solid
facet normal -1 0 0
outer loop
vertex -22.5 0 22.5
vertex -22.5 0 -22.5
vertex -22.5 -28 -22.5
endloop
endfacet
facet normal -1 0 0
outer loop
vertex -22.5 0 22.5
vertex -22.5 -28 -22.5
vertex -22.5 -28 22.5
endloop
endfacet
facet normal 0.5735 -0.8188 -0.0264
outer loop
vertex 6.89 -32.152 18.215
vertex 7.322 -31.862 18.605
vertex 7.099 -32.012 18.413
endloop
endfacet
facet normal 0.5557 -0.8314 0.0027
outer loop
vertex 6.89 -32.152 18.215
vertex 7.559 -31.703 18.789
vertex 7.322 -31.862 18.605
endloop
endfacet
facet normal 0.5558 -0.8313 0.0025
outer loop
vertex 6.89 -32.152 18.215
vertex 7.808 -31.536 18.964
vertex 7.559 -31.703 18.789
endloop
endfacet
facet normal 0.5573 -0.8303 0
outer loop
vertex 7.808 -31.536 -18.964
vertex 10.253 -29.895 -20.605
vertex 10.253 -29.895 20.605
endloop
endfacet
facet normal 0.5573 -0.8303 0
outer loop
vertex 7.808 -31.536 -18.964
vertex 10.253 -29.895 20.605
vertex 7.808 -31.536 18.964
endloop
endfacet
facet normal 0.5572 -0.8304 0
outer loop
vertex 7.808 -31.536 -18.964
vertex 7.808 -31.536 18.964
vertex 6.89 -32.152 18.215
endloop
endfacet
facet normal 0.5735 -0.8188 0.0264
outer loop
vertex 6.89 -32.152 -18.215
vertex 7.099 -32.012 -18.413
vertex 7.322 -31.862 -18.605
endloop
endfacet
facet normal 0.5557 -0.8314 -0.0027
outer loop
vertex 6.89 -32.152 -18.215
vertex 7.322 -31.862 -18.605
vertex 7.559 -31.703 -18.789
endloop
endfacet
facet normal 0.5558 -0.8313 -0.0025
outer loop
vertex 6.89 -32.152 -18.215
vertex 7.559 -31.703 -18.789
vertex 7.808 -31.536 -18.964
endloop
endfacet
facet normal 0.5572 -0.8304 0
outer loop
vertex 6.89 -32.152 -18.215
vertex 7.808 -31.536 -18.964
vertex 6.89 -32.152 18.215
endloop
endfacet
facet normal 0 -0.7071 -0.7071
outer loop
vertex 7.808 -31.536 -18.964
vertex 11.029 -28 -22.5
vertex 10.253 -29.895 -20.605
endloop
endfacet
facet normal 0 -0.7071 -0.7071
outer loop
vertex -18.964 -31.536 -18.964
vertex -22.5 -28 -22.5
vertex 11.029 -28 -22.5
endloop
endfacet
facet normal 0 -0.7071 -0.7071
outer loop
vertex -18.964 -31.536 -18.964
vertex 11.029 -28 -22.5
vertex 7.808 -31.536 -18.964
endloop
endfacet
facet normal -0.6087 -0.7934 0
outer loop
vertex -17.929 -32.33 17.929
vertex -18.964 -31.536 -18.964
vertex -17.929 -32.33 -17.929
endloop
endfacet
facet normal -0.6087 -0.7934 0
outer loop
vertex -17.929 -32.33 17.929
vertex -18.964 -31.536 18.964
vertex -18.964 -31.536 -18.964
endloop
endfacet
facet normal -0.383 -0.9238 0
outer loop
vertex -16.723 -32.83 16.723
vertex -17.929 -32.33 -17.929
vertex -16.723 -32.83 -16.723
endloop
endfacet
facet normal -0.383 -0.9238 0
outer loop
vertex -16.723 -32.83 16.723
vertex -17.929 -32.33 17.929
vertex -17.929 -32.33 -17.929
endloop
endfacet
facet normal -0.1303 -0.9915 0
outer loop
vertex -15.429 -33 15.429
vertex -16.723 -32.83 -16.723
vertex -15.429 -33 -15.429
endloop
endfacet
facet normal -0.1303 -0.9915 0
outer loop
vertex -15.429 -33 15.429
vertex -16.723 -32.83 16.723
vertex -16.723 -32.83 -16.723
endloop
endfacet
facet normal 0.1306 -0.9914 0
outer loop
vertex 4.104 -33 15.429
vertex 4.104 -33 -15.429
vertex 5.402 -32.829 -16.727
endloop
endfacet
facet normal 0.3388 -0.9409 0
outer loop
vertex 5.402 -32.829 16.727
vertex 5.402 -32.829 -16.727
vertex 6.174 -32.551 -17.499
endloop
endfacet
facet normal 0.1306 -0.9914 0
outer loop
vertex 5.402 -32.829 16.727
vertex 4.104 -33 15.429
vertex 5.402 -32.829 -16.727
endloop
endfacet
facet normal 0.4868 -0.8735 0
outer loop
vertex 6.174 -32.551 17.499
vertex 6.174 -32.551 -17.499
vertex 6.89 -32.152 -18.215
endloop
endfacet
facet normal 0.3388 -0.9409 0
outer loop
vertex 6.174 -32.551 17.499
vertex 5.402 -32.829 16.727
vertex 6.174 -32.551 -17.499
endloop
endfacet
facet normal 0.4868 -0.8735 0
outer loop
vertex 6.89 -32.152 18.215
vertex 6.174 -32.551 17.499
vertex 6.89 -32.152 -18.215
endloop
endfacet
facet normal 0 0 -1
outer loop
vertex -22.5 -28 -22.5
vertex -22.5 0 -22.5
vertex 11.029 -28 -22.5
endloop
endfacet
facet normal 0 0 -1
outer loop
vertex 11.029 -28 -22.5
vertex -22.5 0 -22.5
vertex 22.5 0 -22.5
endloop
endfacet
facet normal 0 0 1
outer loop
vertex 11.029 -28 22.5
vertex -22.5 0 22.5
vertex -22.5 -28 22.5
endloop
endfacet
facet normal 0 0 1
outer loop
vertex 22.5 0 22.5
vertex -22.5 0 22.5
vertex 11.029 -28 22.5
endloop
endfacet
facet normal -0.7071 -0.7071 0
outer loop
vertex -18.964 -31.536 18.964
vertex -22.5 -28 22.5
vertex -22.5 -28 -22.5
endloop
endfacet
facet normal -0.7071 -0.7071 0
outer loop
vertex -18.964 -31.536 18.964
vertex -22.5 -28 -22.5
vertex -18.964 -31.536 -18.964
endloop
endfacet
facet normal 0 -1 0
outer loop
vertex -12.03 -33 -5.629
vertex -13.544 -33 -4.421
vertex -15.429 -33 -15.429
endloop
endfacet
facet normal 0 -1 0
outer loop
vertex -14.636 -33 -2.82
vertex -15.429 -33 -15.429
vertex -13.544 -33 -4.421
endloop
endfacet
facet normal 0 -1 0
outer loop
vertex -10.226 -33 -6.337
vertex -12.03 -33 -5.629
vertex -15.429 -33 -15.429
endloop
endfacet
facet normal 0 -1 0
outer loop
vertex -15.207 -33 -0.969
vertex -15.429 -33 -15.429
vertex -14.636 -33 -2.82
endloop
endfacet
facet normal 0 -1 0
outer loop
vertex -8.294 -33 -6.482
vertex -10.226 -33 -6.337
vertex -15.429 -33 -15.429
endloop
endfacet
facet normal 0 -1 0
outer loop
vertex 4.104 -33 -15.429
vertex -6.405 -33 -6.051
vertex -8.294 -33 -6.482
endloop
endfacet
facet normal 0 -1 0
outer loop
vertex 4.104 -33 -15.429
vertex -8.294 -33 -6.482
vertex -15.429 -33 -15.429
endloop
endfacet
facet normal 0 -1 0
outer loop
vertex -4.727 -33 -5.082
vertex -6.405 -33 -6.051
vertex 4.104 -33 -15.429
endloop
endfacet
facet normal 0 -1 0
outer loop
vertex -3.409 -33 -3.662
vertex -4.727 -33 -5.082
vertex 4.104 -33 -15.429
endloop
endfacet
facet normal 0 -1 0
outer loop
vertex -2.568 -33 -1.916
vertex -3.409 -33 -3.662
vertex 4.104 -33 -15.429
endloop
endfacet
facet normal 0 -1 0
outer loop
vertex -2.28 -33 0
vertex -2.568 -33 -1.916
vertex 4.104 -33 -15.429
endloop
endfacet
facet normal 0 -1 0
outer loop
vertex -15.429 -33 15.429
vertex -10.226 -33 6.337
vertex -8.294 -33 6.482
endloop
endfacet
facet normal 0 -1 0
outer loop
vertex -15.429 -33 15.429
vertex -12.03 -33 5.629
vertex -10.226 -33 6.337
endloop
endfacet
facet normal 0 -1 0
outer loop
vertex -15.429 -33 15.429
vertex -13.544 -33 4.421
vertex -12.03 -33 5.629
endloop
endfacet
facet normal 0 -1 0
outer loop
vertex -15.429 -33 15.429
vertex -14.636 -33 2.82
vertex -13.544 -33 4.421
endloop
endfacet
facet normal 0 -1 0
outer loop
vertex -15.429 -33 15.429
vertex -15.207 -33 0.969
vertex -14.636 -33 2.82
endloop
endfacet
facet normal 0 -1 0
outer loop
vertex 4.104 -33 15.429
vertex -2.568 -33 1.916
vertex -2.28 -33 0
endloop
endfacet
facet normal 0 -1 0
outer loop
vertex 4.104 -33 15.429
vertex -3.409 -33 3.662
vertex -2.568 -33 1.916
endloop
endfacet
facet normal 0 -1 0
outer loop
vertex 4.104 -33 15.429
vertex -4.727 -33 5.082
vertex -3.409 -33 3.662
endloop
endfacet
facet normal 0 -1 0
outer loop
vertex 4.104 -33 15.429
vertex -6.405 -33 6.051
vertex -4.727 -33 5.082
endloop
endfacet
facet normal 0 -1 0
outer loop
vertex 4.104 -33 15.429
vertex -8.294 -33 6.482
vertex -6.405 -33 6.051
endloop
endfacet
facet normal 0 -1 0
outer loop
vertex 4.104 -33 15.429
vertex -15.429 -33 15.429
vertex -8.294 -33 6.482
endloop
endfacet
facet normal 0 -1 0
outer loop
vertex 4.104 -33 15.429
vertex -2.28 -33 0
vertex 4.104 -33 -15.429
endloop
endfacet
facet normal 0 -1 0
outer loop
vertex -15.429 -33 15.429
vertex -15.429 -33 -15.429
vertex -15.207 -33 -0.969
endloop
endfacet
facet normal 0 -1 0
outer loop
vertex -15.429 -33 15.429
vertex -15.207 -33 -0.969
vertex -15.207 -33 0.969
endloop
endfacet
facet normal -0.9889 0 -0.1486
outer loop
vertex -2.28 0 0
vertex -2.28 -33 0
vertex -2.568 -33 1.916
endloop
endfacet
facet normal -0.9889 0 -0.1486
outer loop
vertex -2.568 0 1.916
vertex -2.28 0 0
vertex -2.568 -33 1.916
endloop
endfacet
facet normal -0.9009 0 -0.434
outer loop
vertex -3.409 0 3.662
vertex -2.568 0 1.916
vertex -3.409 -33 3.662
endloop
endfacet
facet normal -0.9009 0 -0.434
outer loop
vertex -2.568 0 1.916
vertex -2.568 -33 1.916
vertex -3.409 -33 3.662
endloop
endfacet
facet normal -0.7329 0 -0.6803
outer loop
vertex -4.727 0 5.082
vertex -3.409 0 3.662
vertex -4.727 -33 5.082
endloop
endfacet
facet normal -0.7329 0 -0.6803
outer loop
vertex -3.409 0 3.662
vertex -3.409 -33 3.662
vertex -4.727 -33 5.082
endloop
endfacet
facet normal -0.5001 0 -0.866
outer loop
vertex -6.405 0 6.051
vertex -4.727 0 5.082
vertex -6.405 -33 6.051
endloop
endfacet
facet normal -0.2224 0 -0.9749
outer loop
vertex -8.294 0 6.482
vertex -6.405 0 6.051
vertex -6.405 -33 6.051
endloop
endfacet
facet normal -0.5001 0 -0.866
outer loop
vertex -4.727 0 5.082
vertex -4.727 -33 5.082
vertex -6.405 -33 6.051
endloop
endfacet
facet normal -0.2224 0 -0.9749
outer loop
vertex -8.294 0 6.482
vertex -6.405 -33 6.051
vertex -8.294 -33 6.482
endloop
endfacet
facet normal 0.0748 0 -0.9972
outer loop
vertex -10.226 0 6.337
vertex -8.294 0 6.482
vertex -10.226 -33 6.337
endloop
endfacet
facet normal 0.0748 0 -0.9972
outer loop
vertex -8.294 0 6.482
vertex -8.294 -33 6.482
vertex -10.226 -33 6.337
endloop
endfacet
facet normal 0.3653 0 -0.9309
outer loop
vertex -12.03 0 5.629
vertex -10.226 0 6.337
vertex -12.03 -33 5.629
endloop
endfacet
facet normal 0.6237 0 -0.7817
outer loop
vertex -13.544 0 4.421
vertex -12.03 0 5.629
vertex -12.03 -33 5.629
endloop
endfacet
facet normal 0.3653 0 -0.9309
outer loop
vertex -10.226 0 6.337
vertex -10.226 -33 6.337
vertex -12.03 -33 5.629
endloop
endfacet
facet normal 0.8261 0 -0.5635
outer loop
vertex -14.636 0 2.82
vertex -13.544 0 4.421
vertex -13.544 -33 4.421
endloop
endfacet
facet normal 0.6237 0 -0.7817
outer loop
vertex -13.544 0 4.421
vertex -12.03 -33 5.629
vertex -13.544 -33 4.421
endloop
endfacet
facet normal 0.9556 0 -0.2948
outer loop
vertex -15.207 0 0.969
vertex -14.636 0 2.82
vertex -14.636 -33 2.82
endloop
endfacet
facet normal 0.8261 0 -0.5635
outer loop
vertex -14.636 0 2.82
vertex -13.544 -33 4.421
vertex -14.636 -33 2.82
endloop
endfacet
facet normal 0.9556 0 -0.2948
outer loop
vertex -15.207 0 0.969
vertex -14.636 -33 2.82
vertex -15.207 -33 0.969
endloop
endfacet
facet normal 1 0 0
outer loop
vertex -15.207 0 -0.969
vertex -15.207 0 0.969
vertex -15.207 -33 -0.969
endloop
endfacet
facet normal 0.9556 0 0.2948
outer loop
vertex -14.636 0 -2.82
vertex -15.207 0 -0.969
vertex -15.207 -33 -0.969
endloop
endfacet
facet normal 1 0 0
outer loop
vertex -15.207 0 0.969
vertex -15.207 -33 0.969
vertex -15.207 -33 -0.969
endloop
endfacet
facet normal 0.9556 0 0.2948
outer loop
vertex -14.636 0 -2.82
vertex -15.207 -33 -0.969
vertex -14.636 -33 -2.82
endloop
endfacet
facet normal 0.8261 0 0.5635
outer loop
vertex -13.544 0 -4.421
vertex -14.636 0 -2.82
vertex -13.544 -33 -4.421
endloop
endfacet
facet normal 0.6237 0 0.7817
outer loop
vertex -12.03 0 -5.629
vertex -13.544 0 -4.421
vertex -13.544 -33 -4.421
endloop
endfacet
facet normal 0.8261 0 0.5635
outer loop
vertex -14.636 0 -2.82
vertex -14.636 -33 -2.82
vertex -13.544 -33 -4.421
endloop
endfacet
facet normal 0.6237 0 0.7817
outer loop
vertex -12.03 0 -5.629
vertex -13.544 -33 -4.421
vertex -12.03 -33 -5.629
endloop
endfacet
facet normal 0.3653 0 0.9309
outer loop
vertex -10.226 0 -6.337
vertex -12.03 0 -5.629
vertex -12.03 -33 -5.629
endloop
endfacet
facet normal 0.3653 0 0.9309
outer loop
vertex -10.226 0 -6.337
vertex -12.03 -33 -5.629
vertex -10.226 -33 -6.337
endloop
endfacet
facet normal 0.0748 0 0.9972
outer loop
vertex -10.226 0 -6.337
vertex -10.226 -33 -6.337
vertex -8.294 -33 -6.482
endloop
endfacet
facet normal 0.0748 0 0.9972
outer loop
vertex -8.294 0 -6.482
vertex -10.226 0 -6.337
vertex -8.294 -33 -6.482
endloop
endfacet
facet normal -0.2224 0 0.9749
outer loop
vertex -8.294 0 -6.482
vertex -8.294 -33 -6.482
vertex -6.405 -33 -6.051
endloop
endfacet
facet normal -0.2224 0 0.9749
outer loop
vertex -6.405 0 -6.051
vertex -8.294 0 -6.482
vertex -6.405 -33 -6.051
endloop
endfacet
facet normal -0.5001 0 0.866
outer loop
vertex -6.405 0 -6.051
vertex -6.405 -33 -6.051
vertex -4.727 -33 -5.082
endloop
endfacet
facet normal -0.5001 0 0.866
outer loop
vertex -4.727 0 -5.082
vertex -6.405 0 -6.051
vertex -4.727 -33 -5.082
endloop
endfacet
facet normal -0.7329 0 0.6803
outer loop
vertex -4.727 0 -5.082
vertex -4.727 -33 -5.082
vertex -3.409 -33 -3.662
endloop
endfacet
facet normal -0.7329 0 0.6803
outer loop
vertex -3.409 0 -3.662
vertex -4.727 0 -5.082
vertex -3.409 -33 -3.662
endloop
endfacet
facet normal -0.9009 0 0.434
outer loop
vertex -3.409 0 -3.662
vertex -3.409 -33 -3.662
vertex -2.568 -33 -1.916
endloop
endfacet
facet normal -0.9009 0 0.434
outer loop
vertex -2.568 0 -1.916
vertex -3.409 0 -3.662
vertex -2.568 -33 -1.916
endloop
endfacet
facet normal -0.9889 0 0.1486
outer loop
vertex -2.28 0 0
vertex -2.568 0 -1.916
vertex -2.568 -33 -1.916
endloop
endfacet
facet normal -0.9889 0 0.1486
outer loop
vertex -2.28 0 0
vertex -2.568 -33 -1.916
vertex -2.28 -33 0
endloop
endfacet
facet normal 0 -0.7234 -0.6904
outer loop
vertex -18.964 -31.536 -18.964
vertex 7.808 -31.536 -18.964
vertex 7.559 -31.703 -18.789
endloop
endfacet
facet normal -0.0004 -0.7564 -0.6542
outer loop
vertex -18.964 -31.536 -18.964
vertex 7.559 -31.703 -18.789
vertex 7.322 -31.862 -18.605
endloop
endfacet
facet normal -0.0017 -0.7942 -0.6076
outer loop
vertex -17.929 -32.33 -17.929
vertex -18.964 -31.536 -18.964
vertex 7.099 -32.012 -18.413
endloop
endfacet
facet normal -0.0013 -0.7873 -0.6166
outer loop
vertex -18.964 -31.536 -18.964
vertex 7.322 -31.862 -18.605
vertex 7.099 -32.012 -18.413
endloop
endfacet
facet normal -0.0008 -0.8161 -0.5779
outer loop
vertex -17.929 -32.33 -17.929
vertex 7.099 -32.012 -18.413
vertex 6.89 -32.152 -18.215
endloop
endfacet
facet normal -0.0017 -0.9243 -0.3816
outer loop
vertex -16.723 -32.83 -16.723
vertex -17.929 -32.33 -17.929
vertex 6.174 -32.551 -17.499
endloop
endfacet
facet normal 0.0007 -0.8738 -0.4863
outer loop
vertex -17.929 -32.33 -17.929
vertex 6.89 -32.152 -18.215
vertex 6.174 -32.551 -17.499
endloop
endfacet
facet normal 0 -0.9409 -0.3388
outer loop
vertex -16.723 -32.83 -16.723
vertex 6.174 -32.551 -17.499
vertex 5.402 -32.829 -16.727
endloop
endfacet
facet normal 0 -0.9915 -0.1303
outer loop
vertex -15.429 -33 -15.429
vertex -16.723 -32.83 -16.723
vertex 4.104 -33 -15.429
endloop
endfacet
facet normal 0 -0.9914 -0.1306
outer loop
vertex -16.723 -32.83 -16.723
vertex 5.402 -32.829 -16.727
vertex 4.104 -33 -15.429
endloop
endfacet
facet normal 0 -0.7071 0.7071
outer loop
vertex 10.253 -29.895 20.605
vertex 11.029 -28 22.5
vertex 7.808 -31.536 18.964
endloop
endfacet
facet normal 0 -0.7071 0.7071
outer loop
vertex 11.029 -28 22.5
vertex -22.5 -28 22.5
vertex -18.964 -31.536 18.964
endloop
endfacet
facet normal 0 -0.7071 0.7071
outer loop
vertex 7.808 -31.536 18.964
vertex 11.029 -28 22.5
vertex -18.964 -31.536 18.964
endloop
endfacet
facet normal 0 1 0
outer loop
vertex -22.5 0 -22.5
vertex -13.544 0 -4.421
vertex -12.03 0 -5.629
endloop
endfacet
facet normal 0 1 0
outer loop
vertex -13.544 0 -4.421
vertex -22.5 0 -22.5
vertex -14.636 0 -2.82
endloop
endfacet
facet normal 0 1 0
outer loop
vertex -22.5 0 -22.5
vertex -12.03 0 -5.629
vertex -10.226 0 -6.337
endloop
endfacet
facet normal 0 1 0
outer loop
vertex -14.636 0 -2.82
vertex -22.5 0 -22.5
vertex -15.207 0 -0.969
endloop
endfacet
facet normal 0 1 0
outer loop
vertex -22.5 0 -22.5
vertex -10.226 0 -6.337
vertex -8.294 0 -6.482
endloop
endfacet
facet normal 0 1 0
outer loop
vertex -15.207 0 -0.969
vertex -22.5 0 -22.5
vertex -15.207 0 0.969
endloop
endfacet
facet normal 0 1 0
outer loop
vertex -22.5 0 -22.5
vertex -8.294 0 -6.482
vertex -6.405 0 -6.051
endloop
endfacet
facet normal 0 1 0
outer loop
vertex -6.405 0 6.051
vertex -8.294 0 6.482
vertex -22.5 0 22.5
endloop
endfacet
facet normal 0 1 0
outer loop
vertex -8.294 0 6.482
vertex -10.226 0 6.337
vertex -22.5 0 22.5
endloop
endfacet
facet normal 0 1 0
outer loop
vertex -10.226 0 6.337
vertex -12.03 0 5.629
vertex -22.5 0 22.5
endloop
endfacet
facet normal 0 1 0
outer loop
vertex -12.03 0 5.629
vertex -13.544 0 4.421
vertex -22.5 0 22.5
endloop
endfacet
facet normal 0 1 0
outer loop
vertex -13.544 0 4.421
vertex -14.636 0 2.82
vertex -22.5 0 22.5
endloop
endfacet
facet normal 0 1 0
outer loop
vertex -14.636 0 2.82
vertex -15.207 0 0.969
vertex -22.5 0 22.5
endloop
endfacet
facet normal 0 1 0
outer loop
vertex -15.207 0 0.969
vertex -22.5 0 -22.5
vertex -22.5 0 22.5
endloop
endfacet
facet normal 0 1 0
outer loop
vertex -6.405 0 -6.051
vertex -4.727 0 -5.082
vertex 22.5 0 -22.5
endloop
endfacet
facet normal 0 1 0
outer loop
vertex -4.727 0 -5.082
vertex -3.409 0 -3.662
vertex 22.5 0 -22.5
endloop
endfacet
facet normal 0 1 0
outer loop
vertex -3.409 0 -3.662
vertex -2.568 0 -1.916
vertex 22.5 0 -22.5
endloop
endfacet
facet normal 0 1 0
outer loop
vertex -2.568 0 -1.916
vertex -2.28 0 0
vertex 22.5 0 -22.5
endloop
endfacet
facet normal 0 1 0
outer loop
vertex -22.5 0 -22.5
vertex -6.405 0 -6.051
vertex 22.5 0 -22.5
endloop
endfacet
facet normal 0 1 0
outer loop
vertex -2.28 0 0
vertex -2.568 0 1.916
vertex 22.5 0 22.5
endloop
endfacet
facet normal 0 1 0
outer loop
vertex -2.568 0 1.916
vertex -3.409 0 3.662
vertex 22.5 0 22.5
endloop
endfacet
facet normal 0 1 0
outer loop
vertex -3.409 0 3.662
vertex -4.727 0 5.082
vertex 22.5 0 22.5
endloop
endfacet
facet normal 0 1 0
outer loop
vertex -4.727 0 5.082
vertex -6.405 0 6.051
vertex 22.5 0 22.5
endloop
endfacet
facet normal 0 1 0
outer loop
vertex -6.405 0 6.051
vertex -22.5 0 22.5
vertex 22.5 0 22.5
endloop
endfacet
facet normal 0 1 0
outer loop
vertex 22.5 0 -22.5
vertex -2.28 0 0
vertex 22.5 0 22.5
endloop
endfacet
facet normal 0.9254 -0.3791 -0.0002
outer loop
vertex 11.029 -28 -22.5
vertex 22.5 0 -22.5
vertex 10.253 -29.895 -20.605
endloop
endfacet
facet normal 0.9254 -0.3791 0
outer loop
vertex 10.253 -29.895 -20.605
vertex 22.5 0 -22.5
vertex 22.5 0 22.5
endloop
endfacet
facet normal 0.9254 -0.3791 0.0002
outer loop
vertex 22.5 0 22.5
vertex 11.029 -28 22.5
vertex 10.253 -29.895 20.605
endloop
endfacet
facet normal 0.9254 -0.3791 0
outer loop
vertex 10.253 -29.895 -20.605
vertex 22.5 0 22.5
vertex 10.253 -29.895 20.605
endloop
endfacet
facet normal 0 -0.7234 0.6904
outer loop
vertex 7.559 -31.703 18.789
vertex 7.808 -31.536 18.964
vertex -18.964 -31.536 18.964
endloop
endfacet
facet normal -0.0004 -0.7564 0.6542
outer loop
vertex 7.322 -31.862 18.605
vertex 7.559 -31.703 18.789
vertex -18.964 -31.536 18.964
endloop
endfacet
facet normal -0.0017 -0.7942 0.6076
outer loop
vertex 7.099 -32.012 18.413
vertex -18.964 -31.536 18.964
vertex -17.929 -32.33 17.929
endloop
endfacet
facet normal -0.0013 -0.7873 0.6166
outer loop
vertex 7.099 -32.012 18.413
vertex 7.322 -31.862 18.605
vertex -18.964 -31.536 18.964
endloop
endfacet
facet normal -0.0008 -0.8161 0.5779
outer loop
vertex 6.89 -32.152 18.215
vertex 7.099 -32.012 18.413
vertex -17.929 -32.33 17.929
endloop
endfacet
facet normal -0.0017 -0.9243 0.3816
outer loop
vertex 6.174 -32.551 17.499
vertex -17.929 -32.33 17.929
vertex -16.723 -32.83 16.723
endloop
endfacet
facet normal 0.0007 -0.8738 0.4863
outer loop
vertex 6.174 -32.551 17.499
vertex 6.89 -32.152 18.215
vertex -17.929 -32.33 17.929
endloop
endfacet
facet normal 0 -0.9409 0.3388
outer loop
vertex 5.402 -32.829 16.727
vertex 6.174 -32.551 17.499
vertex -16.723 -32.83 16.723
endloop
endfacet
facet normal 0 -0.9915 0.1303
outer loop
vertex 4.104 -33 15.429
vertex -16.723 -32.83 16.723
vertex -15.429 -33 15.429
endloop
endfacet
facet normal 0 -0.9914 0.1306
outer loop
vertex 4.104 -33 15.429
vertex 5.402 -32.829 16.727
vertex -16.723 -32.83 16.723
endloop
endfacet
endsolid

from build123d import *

# Parameters (mm, degrees)
F0_W        = 45
F0_H        = 45
F1_DEPTH    = 33
F3_DEPTH    = 55.8
F4_R        = 6.5
F5_DEPTH    = 68.3
F6_T1_DEPTH = 57.1976554231
F6_T3_DEPTH = 62.61396425
F6_T5_DEPTH = 70.7168298797
F7_R        = 5


# Not quite as in the source:
# - a fillet or chamfer that OpenCascade refuses, or shapes differently, is made with other operations: its cross-section is extruded or revolved along the edge and cut away or added


with BuildPart() as f1:
    # F0 (on Front) → F1 (new body)
    with BuildSketch(Plane.XZ):
        Rectangle(F0_W, F0_H)
    extrude(amount=F1_DEPTH)

    # F2 (on face) → F3 (cut)
    with BuildSketch(Plane.XY.offset(22.5)):
        Polygon((22.5, -33), (22.5, 0), (8.9808255434, -33), align=None)
    extrude(amount=-F3_DEPTH, mode=Mode.SUBTRACT)

    # F4 (on face) → F5 (cut)
    with BuildSketch(Plane.XZ.offset(33)):
        with Locations((-8.7795946747, 0)):
            Circle(F4_R)
    extrude(amount=-F5_DEPTH, mode=Mode.SUBTRACT)

    # F6: chamfer of 5 on 4 edges, made by hand

    # F6_s2 → F6_t1 (cut)
    with BuildSketch(Plane.YZ.offset(-35.3584149398)):
        Polygon((-28, 22.5), (-33, 17.5), (-33, 22.5), align=None)
        Polygon((-28, -22.5), (-33, -17.5), (-33, -22.5), align=None)
    extrude(amount=F6_T1_DEPTH, mode=Mode.SUBTRACT)

    # F6_s4 → F6_t3 (cut)
    with BuildSketch(Plane.XY.offset(-31.306982125)):
        Polygon((10.252665661, -29.8954669522), (5.6258735721, -33), (8.9808255434, -33), align=None)
    extrude(amount=F6_T3_DEPTH, mode=Mode.SUBTRACT)

    # F6_s6 → F6_t5 (cut)
    with BuildSketch(Plane.XY.offset(-35.3584149398)):
        Polygon((-22.5, -28), (-17.5, -33), (-22.5, -33), align=None)
    extrude(amount=F6_T5_DEPTH, mode=Mode.SUBTRACT)

    # F7
    f7_edges = [f1.edges().sort_by_distance(p)[0] for p in [
        (-5.937063, -33, 17.5),
        (5.625874, -33, 0),
        (-5.937063, -33, -17.5),
        (-17.5, -33, 0),
    ]]
    fillet(f7_edges, radius=F7_R)


solid = f1.part
